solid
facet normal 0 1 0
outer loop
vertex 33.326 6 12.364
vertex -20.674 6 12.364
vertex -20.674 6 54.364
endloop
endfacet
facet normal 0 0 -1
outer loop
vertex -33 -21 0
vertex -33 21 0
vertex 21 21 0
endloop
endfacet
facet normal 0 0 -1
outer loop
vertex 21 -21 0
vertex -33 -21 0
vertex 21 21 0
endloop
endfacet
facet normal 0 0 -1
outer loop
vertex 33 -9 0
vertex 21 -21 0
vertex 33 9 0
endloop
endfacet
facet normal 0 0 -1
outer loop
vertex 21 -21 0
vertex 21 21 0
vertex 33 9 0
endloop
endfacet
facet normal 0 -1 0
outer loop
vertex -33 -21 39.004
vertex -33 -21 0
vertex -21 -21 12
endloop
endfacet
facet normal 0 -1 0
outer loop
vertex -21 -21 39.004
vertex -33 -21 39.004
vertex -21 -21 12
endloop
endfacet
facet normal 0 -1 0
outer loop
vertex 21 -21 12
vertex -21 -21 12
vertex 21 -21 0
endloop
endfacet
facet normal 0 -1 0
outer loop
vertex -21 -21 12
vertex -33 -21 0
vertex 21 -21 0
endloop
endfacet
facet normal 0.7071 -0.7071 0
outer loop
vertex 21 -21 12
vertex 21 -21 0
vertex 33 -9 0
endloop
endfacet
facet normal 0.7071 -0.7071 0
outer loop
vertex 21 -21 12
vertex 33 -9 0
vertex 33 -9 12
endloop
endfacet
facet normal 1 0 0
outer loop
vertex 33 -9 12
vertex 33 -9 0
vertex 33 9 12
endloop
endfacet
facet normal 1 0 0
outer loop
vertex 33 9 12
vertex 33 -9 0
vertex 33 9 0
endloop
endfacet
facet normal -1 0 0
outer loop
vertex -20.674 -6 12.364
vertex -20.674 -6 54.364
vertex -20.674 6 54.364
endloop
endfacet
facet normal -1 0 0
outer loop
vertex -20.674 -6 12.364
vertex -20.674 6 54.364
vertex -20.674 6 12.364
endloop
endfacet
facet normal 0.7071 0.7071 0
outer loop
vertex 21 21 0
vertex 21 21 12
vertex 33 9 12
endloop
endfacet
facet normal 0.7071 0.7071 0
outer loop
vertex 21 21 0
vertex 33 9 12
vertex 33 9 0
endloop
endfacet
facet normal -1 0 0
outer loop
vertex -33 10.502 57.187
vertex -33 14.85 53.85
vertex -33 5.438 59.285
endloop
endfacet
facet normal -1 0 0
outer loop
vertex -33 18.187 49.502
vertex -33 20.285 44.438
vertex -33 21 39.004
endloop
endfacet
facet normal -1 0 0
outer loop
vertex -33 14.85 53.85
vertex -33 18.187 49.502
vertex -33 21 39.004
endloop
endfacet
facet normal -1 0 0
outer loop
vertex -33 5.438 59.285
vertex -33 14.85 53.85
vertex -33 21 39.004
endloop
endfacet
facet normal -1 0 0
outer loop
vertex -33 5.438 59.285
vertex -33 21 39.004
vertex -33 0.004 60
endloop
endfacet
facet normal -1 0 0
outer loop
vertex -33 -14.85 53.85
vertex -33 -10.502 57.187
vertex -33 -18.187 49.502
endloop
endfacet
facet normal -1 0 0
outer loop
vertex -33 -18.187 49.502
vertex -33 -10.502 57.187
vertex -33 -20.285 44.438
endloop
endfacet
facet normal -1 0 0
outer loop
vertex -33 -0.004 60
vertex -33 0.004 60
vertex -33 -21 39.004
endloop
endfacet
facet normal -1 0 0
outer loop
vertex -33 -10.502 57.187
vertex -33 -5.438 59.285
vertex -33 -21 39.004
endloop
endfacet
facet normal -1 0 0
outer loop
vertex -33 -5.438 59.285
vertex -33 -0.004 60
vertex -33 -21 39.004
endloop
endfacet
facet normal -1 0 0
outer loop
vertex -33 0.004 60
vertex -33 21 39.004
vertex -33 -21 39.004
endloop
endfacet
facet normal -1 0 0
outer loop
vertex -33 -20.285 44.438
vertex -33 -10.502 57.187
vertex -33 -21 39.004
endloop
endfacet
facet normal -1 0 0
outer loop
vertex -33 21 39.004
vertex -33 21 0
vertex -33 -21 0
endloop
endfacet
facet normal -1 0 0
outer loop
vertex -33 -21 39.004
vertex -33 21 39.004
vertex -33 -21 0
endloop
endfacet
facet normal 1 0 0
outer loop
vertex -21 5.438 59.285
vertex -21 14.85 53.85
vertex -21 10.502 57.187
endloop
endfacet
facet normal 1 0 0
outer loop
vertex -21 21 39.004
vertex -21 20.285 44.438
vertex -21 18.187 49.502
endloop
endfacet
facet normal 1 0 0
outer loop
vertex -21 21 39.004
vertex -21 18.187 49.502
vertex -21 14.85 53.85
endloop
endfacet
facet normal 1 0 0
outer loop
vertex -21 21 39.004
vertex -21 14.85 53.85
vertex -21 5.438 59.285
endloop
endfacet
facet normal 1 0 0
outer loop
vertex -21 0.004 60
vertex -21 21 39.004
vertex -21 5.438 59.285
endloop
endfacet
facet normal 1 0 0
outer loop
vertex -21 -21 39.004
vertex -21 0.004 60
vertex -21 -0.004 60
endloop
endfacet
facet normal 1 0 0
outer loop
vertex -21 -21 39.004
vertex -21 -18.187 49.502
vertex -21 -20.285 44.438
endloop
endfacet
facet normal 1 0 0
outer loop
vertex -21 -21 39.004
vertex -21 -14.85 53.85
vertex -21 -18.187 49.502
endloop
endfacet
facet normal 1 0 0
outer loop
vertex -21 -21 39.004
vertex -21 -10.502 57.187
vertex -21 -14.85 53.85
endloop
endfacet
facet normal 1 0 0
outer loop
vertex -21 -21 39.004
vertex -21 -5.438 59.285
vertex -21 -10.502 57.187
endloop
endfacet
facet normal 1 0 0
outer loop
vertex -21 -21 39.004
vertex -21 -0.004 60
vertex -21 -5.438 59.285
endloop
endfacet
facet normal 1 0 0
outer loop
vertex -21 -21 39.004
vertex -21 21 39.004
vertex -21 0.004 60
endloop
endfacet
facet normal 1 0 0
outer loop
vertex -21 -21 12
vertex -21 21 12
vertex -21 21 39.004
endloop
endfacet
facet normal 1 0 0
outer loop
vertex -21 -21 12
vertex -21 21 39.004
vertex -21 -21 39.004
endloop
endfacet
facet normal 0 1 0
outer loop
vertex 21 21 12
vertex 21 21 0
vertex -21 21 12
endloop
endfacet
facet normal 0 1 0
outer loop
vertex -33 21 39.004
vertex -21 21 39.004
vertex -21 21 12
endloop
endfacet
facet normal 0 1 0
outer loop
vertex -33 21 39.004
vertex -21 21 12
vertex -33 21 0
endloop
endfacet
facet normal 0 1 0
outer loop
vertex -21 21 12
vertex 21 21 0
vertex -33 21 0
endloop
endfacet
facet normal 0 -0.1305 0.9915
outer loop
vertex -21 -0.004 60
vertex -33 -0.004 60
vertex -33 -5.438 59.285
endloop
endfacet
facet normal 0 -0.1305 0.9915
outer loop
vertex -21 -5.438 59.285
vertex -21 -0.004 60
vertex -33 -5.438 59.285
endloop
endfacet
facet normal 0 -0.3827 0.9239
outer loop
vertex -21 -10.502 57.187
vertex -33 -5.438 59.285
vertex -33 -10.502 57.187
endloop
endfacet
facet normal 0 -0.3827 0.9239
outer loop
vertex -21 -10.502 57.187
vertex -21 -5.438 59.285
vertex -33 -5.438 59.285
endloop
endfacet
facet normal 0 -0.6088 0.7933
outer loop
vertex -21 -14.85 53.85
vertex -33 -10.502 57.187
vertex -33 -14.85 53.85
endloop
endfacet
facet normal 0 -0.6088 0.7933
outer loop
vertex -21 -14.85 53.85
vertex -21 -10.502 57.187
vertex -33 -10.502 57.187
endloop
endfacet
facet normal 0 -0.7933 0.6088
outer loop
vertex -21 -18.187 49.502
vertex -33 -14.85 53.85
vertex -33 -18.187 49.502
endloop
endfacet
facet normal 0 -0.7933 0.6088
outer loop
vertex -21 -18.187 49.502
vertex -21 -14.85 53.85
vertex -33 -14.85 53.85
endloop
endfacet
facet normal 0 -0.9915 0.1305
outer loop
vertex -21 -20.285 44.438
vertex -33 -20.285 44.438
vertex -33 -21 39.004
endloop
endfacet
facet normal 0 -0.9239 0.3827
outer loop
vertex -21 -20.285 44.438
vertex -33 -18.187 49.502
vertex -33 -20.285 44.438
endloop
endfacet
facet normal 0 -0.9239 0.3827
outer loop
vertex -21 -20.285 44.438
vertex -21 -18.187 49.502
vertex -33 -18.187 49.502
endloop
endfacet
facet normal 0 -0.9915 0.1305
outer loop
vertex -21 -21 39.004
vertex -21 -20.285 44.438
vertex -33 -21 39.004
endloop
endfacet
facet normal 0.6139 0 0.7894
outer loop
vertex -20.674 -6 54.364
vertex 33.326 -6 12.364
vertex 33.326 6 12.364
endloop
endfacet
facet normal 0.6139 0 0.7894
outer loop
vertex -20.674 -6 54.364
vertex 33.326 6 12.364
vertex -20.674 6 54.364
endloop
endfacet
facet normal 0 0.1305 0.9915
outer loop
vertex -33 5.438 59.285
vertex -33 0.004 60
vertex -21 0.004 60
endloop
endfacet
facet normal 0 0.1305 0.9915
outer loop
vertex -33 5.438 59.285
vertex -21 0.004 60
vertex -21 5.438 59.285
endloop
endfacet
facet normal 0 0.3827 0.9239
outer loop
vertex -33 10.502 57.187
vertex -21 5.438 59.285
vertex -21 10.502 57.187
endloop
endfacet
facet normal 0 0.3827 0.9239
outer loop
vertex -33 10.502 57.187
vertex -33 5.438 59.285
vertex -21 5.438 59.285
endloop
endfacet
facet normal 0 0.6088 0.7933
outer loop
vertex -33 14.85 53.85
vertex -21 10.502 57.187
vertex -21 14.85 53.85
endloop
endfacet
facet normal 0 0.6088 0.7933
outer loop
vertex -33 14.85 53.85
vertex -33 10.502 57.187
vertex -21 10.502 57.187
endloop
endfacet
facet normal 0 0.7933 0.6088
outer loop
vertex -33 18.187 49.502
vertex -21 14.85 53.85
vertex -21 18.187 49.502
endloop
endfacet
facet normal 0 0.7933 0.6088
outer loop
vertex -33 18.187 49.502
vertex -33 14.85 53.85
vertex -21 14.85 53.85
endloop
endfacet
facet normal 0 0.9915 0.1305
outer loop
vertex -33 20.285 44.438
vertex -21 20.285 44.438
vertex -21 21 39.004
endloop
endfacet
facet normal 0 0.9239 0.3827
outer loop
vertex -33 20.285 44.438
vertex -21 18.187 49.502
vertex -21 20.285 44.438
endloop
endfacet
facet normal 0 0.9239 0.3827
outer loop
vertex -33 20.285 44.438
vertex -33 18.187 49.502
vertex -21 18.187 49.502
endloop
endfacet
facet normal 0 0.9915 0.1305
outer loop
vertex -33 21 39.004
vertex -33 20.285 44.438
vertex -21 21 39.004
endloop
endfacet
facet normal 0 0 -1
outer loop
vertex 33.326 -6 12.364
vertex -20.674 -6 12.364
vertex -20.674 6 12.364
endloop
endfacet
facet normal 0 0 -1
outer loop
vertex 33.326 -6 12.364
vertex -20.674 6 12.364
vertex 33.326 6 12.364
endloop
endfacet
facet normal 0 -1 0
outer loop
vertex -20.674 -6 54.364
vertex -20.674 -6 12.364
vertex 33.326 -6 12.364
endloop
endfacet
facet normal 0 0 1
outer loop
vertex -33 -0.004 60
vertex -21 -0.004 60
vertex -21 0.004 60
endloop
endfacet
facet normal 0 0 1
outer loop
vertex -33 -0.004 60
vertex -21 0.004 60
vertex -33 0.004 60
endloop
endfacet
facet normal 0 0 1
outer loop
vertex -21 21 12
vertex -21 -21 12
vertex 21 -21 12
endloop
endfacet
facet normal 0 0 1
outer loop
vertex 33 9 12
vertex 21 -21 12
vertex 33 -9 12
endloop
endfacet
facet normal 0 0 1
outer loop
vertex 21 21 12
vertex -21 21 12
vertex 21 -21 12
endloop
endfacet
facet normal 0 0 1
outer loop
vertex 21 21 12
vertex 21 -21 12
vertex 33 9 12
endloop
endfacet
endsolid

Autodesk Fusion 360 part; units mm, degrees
sketch "Base" plane through (0, 0, 0) normal (0, 0, 1) x (1, 0, 0)
  line L0 (33, 21) -> (-33, 21)
  line L1 (-33, 21) -> (-33, -21)
  line L2 (-33, -21) -> (33, -21)
  line L3 (33, -21) -> (33, 21)
  line L4 (33, 21) -> (-33, -21) construction
  line L5 (-33, 21) -> (33, -21) construction
  dimension "d1" = 66
  dimension "d2" = 42
extrude "Extrude1" add sketch "Base" along normal blind 12 makes body 1
chamfer "Chamfer1" distance 12 angle 45 2 edges at (33, -21, 6) (33, 21, 6) on bodies 1
sketch "back" plane through (0, 0, 12) normal (0, 0, 1) x (-1, 0, 0)
  line L0 (-33, -9) -> (-21, -21)
  line L1 (-21, -21) -> (33, -21)
  line L2 (33, -21) -> (33, 21)
  line L3 (33, 21) -> (-21, 21)
  line L4 (-21, 21) -> (-33, 9)
  line L5 (-33, 9) -> (-33, -9)
  line L6 (33, -21) -> (21, -21)
  line L7 (21, -21) -> (21, 21)
  line L8 (21, 21) -> (33, 21)
  line L9 (33, 21) -> (33, -21)
  dimension "d7" = 12
extrude "Extrude2" add sketch "back" along normal blind 48 contours L1 L2 L3 L6 L7 L8 L9 bodies 1
fillet "Fillet1" radius 21 2 edges at (-27, -21, 60) (-27, 21, 60) on bodies 1
sketch "triangle" plane through (0, 0, 0) normal (0, 1, 0) x (1, 0, 0)
  line L0 (-20.6741, -54.3635) -> (-20.6741, -12.3635)
  line L1 (-20.6741, -12.3635) -> (33.3259, -12.3635)
  line L2 (33.3259, -12.3635) -> (-20.6741, -54.3635)
  dimension "d12" = 42
  dimension "d13" = 54
extrude "Extrude3" add sketch "triangle" along normal mid plane 12 separate body makes body 2
equation "d8 = 60 mm - 12 mm"
